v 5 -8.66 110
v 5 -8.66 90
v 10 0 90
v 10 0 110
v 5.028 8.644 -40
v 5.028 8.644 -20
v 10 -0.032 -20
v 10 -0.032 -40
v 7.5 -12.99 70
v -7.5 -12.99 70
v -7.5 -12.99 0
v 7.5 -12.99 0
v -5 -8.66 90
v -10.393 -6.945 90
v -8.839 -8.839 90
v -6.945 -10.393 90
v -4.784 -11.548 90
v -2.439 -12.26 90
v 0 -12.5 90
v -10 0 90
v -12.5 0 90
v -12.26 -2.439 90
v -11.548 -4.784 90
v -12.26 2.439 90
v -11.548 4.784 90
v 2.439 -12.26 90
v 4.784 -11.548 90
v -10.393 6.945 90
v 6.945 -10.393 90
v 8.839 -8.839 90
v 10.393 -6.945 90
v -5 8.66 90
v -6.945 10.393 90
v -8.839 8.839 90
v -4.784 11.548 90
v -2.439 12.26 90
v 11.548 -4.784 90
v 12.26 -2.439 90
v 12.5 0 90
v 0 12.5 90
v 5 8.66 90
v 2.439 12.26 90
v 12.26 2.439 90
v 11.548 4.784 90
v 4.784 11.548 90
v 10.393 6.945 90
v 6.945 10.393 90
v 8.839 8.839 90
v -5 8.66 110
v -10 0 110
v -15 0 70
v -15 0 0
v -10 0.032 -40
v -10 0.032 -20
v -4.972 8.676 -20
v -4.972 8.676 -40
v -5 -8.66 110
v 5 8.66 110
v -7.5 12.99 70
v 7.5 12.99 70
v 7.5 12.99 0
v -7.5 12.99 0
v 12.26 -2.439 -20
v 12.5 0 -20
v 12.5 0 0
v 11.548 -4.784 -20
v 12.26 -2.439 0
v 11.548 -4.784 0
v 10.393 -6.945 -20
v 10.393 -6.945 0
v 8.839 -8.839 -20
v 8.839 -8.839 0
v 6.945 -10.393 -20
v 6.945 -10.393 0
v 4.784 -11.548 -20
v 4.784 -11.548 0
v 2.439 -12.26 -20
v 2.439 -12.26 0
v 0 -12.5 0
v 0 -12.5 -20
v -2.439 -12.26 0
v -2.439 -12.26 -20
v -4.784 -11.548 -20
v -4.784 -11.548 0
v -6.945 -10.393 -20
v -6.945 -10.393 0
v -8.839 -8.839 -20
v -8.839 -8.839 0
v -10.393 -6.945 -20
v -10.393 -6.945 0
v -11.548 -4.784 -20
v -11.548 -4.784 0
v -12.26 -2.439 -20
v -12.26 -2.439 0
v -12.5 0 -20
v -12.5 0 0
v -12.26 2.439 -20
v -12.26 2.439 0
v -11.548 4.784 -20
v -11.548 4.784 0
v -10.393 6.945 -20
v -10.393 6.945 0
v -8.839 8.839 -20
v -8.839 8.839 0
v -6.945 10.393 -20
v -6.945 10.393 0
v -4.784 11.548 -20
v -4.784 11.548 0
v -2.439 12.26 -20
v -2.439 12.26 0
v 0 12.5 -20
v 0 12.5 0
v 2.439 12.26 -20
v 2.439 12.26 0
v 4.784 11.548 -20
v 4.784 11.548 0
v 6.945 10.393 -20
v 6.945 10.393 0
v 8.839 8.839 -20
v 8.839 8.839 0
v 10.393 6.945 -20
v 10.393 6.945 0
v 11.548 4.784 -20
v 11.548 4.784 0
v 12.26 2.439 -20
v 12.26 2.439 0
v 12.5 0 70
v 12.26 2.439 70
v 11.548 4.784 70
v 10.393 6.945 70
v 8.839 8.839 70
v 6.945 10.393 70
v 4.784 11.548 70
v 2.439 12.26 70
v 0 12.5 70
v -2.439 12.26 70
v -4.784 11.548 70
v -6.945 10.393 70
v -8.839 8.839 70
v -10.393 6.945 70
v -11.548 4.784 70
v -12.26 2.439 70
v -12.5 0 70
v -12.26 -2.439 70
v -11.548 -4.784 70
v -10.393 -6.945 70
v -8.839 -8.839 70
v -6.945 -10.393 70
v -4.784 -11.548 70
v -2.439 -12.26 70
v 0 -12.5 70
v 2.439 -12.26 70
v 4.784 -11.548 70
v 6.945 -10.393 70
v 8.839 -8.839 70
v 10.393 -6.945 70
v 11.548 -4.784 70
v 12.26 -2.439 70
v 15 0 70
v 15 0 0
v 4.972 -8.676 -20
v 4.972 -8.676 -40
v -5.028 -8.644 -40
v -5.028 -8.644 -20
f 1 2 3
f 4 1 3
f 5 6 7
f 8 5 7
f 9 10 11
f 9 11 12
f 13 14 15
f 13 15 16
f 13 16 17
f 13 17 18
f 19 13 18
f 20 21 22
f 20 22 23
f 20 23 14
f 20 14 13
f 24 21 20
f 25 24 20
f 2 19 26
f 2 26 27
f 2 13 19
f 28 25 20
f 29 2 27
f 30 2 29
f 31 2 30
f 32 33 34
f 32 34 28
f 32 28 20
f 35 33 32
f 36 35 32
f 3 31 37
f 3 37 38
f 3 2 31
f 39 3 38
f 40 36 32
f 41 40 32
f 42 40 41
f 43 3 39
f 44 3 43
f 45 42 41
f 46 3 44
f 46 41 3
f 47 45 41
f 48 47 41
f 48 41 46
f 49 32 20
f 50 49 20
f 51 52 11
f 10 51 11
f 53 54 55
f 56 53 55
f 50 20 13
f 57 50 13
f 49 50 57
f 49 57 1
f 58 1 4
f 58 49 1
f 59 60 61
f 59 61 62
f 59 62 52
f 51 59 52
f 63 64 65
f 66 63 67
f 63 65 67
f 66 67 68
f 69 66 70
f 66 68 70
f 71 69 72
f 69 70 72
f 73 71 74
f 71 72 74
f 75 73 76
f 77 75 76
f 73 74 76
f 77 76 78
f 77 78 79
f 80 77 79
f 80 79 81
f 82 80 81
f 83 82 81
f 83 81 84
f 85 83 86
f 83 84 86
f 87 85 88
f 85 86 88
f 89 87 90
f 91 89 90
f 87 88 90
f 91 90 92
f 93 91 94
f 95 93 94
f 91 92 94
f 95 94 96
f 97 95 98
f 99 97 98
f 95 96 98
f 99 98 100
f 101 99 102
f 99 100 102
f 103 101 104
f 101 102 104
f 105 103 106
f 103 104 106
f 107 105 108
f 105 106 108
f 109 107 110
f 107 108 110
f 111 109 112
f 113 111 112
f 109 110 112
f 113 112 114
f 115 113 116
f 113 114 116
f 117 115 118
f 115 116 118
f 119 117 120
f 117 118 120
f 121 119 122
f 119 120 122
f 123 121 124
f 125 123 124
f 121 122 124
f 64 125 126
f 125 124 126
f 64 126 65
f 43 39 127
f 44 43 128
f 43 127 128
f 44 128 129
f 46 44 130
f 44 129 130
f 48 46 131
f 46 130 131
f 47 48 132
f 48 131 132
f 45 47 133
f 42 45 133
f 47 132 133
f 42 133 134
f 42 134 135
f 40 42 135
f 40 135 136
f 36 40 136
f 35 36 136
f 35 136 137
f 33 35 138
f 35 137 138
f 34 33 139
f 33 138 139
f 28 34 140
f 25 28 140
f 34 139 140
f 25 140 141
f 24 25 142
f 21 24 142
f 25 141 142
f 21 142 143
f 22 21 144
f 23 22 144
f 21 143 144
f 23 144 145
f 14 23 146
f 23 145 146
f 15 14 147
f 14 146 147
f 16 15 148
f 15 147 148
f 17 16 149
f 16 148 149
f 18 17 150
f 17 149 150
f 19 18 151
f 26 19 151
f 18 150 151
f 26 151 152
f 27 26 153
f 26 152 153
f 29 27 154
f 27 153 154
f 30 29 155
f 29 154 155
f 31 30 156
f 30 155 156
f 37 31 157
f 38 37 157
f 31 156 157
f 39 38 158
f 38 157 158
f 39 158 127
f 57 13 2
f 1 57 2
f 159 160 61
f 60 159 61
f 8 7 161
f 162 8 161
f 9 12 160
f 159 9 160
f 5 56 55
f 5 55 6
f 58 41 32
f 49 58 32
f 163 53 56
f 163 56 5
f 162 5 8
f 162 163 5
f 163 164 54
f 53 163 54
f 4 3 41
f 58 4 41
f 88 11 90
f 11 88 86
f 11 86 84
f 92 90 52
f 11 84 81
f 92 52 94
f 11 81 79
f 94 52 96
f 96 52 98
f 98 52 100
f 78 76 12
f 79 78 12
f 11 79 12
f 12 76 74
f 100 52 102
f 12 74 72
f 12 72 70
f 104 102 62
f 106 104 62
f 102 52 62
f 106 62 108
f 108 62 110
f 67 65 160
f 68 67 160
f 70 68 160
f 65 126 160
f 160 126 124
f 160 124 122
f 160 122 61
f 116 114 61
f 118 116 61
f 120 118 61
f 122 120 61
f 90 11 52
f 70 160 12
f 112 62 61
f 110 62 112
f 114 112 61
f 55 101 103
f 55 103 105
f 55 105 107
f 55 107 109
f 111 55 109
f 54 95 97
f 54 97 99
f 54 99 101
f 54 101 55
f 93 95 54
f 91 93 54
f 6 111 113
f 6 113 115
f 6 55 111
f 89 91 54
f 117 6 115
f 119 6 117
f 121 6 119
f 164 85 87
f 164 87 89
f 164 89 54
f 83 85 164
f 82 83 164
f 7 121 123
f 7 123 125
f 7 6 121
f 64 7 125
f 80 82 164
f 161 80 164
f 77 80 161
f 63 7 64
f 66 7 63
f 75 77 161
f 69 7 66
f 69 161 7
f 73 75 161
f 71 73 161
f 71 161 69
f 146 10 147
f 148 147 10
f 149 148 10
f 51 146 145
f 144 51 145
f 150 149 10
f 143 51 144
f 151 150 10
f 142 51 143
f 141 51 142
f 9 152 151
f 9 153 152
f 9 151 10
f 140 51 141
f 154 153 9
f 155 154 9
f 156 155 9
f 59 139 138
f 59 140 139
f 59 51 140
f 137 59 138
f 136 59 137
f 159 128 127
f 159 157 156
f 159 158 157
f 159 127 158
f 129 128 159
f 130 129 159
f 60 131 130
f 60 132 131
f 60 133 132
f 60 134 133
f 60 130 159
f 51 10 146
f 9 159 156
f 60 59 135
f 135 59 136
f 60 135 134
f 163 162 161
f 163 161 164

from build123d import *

# Parameters (mm, degrees)
F1_DEPTH = 70
F2_R     = 12.5
F3_DEPTH = 20
F4_R     = 12.5
F5_DEPTH = 20
F7_DEPTH = 20
F9_DEPTH = 20


with BuildPart() as f1:
    # F0 (on Top) → F1 (new body)
    with BuildSketch(Plane.XY):
        Polygon((-7.5, 12.990381), (-15, 0), (-7.5, -12.990381), (7.5, -12.990381), (15, 0), (7.5, 12.990381), align=None)
    extrude(amount=F1_DEPTH)

    # F2 (on face) → F3 (join)
    with BuildSketch(Plane.XY.offset(70)):
        Circle(F2_R)
    extrude(amount=F3_DEPTH)

    # F4 (on face) → F5 (join)
    with BuildSketch(Plane(origin=(0, 0, 0), x_dir=(1, 0, 0), z_dir=(0, 0, -1))):
        Circle(F4_R)
    extrude(amount=F5_DEPTH)

    # F6 (on face) → F7 (join)
    with BuildSketch(Plane.XY.offset(90)):
        Polygon((5, 8.660254), (-5, 8.660254), (-10, 0), (-5, -8.660254), (5, -8.660254), (10, 0), align=None)
    extrude(amount=F7_DEPTH)

    # F8 (on face) → F9 (join)
    with BuildSketch(Plane(origin=(0, 0, -20), x_dir=(1, 0, 0), z_dir=(0, 0, -1))):
        Polygon((9.999949, 0.032092), (4.972181, 8.676256), (-5.027767, 8.644163), (-9.999949, -0.032092), (-4.972181, -8.676256), (5.027767, -8.644163), align=None)
    extrude(amount=F9_DEPTH)


solid = f1.part
